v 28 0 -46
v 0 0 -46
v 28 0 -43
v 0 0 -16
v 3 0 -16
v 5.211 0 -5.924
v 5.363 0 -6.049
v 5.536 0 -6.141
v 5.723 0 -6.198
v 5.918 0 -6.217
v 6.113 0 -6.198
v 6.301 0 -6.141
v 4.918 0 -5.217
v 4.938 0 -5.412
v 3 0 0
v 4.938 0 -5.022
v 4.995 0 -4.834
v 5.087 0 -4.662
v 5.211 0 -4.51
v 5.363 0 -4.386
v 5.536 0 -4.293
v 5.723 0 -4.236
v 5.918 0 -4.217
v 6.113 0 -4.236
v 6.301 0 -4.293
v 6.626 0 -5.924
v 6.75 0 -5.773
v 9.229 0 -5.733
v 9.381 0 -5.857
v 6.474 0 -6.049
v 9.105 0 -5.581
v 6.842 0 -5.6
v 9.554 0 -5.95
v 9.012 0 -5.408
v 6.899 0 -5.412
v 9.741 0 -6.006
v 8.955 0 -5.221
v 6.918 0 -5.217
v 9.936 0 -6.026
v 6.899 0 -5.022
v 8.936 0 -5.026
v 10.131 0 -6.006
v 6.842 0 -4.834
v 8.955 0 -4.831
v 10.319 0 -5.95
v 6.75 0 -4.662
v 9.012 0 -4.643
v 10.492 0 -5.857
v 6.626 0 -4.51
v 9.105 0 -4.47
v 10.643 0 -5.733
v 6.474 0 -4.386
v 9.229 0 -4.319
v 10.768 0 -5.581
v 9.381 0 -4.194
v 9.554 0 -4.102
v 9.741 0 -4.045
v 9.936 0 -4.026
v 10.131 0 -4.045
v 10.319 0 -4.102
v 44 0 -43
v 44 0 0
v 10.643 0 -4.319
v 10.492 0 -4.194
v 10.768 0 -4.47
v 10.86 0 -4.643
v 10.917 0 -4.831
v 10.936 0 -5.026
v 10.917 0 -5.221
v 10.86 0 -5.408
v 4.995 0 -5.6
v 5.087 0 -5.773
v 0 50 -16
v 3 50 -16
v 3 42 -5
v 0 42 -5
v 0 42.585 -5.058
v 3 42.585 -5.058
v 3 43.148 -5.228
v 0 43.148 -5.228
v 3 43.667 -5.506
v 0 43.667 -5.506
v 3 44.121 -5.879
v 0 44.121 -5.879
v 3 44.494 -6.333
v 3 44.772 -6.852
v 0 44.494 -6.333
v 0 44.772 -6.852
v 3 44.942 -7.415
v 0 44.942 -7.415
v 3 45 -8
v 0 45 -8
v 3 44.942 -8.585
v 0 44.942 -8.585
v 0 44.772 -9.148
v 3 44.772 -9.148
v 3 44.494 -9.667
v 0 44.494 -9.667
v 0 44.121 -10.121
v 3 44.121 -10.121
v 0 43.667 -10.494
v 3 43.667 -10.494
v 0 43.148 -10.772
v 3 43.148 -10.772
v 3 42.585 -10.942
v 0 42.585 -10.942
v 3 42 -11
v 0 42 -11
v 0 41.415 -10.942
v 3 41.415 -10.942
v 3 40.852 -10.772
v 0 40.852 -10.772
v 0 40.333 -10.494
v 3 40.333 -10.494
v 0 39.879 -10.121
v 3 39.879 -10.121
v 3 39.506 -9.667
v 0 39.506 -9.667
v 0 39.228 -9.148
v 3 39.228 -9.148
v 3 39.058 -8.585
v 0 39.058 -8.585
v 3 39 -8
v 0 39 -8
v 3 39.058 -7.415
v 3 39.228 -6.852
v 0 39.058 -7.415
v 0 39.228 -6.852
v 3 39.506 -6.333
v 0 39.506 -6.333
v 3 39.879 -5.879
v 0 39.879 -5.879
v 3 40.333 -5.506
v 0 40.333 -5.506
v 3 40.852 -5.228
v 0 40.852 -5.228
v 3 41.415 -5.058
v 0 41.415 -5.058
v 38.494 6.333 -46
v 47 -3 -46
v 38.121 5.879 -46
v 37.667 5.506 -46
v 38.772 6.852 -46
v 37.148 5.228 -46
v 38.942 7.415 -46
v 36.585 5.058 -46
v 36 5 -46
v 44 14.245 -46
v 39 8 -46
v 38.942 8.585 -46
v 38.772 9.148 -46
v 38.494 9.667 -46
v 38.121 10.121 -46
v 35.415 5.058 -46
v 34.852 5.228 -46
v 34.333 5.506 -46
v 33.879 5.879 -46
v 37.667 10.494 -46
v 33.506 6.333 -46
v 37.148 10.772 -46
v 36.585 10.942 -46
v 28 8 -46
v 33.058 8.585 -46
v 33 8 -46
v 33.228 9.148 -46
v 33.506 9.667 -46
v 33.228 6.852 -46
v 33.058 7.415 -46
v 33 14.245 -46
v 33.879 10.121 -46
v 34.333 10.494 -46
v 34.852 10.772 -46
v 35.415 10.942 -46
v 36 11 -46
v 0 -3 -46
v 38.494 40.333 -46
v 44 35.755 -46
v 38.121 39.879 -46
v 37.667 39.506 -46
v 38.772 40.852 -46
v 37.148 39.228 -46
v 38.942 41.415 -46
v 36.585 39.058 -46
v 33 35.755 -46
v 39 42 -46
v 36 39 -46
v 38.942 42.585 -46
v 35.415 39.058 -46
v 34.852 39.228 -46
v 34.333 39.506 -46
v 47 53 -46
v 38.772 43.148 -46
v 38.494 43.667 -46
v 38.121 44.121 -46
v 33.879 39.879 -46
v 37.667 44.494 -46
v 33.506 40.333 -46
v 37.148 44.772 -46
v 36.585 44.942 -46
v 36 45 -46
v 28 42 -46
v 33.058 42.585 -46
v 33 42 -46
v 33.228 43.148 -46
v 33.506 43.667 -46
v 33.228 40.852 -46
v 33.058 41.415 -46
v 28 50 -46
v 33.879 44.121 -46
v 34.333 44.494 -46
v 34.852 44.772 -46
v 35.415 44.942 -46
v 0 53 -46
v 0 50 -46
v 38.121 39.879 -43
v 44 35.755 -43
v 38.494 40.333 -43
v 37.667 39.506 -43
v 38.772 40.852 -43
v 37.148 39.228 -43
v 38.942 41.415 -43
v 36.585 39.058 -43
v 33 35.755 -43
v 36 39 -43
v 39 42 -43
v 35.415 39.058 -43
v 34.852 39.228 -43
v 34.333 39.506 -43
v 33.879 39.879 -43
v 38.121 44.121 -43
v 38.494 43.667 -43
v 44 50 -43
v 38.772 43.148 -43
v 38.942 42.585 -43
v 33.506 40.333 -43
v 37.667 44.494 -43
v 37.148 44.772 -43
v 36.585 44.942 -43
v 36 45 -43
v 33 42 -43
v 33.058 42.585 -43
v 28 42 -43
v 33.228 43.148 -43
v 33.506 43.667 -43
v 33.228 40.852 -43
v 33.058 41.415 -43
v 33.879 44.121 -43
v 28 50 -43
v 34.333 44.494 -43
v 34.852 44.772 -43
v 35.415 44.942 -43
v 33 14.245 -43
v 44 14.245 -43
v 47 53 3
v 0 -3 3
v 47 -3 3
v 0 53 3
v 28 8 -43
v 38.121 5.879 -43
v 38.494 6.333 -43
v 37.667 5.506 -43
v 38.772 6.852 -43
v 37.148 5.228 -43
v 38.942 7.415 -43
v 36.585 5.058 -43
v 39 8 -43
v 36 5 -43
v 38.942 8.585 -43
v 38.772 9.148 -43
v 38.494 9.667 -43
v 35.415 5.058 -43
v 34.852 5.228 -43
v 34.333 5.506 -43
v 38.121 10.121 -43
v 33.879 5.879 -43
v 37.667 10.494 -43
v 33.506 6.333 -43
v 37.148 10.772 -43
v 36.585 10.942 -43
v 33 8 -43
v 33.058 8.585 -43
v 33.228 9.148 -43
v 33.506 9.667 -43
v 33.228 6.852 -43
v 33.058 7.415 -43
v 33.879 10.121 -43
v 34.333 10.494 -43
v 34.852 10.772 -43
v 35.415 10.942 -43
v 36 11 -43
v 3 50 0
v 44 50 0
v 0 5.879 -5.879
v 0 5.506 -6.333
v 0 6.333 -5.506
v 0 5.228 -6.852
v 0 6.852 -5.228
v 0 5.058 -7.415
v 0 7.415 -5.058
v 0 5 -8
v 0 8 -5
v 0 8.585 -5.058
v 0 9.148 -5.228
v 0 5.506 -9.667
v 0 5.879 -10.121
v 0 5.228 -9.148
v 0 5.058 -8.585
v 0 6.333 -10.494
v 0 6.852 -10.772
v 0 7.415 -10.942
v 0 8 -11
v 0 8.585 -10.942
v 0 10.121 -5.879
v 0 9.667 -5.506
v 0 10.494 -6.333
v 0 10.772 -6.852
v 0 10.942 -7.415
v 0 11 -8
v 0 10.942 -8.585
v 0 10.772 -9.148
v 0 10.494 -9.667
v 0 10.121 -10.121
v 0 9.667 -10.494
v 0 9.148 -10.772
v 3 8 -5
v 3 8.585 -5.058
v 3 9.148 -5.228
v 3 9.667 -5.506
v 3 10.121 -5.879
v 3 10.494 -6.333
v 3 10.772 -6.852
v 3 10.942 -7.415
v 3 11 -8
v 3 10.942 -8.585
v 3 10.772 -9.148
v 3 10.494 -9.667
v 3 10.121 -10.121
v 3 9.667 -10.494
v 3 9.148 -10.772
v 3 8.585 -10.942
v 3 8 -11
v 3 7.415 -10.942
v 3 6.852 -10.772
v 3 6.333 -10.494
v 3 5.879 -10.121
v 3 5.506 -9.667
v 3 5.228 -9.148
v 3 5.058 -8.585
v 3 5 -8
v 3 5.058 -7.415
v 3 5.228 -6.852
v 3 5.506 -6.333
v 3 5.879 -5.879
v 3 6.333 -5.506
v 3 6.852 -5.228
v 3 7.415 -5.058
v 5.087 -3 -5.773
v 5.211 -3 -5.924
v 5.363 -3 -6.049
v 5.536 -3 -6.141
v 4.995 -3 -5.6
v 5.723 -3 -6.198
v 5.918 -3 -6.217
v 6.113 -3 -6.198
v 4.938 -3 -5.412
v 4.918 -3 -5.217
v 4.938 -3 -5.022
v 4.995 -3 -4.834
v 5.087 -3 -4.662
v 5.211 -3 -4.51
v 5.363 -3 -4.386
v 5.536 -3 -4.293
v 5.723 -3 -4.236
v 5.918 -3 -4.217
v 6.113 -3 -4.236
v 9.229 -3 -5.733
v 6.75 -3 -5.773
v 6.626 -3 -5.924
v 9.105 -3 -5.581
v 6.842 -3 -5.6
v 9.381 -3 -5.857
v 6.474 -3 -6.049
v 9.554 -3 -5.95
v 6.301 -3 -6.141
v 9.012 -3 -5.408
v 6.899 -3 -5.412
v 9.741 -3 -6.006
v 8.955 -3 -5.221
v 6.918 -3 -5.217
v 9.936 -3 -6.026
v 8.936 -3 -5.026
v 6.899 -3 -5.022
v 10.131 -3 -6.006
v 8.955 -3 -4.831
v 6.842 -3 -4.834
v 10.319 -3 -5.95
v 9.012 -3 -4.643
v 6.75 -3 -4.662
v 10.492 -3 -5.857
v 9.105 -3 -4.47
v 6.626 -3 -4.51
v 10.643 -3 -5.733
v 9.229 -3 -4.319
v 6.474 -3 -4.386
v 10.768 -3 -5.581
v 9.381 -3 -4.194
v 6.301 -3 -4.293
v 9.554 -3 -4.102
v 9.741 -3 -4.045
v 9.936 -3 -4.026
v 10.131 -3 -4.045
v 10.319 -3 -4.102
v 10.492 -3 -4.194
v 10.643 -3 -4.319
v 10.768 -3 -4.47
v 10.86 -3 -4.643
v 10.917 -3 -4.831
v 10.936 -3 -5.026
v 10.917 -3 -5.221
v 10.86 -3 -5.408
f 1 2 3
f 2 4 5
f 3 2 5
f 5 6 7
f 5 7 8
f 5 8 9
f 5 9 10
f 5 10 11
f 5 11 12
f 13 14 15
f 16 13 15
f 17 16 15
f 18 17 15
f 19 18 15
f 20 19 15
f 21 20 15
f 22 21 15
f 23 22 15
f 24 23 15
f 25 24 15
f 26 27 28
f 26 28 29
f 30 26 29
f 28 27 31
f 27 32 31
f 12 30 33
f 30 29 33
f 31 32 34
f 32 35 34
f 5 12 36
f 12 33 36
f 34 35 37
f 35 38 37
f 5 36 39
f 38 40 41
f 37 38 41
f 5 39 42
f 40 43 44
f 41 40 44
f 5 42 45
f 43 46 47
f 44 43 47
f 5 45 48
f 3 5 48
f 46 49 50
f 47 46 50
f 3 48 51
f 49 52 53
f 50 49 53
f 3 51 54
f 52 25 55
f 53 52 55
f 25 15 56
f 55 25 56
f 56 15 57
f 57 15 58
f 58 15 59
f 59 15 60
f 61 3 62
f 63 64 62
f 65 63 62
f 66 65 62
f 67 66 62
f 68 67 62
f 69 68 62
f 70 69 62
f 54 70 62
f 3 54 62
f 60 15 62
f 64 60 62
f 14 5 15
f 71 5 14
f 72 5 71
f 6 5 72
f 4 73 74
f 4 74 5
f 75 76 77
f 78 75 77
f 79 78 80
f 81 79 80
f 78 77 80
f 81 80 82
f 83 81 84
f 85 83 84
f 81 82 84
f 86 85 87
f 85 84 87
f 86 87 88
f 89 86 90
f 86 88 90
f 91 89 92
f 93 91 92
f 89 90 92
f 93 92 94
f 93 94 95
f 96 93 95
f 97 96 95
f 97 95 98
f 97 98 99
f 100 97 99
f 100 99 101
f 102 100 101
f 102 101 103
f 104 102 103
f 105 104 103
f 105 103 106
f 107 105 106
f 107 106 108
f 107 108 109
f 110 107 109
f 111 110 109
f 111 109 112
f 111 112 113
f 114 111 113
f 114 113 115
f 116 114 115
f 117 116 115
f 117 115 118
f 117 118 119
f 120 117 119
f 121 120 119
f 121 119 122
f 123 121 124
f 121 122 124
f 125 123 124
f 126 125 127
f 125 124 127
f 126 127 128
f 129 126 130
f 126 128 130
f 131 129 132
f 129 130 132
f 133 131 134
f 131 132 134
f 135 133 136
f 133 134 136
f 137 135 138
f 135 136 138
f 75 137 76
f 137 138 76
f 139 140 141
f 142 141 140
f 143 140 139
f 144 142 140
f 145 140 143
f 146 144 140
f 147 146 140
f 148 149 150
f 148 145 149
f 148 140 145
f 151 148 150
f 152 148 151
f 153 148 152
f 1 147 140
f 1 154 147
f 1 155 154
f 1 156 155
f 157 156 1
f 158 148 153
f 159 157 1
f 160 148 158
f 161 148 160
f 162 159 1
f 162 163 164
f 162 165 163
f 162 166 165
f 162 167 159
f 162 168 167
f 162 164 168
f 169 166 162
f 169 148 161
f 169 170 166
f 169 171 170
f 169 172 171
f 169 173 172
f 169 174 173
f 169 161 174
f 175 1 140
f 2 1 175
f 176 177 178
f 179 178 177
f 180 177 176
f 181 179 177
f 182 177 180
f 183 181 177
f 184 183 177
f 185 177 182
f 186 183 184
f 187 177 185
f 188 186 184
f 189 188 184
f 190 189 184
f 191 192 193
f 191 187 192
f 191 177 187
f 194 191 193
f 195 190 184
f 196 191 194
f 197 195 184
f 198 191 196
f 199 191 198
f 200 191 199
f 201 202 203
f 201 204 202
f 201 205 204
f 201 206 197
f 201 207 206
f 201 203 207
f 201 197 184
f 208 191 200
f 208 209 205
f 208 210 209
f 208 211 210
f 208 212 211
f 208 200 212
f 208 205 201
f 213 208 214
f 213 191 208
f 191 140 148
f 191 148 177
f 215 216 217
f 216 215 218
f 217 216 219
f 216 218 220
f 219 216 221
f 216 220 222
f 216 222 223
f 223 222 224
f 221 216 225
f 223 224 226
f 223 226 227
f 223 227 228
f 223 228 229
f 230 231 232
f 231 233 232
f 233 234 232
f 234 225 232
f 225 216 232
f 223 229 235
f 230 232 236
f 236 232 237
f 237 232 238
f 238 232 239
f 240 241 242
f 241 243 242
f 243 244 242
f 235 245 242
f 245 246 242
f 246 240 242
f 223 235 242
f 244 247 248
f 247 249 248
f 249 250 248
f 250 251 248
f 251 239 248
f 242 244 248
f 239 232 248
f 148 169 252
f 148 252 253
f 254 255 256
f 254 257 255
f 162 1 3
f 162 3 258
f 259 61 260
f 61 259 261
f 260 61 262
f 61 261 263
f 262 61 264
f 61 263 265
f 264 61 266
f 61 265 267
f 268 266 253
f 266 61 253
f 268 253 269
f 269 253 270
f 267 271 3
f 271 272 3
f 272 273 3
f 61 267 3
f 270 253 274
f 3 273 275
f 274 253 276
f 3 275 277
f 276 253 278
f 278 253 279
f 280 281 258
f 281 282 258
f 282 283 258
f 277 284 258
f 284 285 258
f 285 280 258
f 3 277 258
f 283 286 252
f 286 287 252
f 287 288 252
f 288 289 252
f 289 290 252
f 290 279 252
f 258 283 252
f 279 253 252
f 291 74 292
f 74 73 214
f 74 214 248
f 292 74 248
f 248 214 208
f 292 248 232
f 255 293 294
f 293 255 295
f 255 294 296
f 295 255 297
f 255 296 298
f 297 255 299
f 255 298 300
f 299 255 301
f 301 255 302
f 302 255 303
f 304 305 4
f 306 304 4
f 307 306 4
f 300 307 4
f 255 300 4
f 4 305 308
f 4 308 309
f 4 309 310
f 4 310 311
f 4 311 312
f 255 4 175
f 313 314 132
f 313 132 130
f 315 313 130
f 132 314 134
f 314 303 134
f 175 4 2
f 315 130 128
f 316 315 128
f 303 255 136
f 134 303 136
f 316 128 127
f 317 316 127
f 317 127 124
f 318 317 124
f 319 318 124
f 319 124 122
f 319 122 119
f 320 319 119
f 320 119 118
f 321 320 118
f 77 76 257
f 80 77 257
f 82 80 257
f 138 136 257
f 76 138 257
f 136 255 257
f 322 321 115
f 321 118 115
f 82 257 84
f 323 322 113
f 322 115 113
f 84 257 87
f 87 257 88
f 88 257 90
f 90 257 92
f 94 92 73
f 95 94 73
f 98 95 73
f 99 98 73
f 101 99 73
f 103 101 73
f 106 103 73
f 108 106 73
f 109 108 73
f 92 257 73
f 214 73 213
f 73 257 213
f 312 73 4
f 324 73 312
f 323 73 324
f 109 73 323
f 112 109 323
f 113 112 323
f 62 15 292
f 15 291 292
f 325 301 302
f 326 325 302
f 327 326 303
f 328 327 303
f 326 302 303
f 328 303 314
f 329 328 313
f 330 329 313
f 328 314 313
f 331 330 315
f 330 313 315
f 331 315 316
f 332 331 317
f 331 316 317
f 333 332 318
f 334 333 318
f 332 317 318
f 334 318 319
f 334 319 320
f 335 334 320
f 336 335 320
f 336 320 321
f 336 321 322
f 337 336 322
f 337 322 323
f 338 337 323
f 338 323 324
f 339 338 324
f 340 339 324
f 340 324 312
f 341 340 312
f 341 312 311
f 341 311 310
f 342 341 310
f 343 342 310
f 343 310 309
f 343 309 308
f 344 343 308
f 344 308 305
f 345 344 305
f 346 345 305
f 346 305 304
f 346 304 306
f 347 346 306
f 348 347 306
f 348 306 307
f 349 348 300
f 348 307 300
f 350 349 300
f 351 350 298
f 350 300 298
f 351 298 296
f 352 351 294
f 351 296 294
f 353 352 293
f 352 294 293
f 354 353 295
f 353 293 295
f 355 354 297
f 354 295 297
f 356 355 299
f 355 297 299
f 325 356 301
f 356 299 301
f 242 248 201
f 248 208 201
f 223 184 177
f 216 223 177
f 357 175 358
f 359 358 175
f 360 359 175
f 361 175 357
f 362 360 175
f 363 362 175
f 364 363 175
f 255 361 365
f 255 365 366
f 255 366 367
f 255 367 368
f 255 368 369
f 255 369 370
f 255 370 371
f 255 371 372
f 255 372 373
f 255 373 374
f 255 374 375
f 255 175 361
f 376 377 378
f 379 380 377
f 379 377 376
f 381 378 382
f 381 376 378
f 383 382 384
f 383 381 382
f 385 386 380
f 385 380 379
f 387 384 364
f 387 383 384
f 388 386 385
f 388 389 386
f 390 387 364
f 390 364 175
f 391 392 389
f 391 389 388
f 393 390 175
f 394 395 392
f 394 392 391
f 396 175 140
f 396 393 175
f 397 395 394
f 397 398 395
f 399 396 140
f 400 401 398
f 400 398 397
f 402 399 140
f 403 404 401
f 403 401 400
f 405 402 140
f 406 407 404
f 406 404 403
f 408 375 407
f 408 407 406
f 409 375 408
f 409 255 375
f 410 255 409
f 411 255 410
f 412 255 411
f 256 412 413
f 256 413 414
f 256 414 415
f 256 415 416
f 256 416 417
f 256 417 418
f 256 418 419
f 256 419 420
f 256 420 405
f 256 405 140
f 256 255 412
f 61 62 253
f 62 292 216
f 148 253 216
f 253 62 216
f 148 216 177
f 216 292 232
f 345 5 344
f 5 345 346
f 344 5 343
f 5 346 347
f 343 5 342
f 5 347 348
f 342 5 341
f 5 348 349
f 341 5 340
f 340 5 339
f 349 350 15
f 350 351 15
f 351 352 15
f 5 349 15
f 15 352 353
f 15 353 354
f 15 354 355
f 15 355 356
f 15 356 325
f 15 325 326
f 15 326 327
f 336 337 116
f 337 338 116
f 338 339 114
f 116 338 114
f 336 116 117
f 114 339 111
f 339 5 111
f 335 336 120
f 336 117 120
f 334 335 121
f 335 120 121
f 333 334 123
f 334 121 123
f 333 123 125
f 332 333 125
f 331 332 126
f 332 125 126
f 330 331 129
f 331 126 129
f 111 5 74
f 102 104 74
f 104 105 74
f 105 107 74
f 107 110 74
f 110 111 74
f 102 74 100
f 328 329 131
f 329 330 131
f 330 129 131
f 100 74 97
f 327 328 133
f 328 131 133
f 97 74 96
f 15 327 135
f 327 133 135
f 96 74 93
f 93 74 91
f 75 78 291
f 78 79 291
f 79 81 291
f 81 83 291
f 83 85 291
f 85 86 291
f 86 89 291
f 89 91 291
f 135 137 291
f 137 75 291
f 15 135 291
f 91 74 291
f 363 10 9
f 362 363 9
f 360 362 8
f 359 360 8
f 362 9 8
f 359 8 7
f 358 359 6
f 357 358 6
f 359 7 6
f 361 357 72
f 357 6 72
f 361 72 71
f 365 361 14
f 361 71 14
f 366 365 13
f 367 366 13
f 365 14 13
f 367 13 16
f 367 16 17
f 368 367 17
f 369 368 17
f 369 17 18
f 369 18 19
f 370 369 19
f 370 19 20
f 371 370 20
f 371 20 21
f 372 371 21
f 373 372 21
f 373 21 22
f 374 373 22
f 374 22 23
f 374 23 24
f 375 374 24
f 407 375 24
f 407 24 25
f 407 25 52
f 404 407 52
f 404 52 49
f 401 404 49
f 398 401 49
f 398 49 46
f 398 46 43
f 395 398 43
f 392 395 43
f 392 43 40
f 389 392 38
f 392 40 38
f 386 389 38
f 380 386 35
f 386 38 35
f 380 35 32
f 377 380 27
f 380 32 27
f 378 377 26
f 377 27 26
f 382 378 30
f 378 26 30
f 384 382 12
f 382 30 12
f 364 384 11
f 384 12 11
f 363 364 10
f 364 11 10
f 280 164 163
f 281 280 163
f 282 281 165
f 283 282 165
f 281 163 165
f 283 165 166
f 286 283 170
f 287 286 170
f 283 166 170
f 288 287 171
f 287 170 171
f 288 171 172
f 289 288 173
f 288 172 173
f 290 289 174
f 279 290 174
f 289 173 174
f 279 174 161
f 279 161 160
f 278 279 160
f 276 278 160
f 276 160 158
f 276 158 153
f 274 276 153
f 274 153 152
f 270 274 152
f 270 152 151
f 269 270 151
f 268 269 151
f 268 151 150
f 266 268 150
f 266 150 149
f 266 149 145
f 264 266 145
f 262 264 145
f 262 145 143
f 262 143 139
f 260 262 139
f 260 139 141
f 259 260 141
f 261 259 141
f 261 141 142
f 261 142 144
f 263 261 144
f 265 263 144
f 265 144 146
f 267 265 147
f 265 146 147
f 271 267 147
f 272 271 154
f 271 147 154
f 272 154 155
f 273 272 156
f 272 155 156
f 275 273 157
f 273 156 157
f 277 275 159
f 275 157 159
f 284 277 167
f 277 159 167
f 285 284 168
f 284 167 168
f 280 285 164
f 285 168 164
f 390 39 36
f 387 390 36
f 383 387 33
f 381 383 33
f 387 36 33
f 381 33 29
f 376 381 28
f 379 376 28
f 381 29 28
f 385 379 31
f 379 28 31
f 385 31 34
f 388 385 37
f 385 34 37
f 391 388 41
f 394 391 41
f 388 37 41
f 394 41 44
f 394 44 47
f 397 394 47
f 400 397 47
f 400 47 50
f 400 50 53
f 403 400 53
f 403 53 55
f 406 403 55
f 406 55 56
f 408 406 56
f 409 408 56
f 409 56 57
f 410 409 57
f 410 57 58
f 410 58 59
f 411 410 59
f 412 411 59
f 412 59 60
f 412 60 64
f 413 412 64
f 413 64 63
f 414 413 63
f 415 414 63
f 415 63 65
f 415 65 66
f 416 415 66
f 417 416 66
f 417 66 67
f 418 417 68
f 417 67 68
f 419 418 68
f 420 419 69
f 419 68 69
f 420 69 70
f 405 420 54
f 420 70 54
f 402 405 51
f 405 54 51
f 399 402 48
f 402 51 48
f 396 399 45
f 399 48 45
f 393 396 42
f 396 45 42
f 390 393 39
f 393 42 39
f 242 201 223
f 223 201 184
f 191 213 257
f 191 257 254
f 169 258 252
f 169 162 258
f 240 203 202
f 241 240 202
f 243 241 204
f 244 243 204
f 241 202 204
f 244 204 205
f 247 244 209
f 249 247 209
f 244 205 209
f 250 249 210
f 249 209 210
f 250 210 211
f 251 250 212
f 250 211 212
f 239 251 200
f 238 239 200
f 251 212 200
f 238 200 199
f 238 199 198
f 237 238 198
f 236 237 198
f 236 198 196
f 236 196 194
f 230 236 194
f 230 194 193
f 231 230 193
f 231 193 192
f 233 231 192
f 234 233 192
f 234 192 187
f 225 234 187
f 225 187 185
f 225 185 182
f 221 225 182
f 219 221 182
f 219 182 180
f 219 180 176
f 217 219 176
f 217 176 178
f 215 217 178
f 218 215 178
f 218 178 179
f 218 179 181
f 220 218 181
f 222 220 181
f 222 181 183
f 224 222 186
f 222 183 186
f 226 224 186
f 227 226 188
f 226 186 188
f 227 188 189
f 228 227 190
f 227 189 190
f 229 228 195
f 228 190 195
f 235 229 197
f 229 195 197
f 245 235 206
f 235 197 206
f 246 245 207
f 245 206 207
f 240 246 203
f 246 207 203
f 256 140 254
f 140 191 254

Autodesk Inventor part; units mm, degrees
ref_plane "YZ Plane" through (0, 0, 0) normal (1, 0, 0) x (0, 1, 0)
ref_plane "XZ Plane" through (0, 0, 0) normal (0, 1, 0) x (-1, 0, 0)
ref_plane "XY Plane" through (0, 0, 0) normal (0, 0, 1) x (1, 0, 0)
sketch "Esboço1" plane through (0, 0, 0) normal (0, 0, 1) x (1, 0, 0)
  line L0 (0, 0) -> (44, 0)
  line L1 (44, 0) -> (44, 50)
  line L2 (44, 50) -> (0, 50)
  line L3 (0, 50) -> (0, 0)
  dimension "d0" = 44
  dimension "d1" = 50
extrude "Extrusão1" add sketch "Esboço1" along normal blind 3
sketch "Esboço2" plane through (0, 0, 0) normal (-1, 0, 0) x (0, 0, 1)
  line L0 (0, 0) -> (0, 50) projected
  line L1 (0, 50) -> (-16, 50)
  line L2 (-16, 50) -> (-16, 0)
  line L3 (-16, 0) -> (0, 0)
  line L4 (0, 0) -> (0, 50)
  line L5 (0, 50) -> (-8, 50) construction
  line L6 (-8, 50) -> (-8, 42) construction
  line L7 (0, 0) -> (-8, 0) construction
  line L8 (-8, 0) -> (-8, 8) construction
  circle A0 centre (-8, 42) radius 3
  circle A1 centre (-8, 8) radius 3
  dimension "d4" = 16
  dimension "d5" = 50
  dimension "d6" = 8
  dimension "d7" = 8
  dimension "d8" = 8
  dimension "d9" = 8
  dimension "d10" = 6
  dimension "d11" = 6
extrude "Extrusão2" add sketch "Esboço2" against normal blind 3
sketch "Esboço3" plane through (44, 0, 0) normal (1, 0, 0) x (0, 0, -1)
  line L0 (0, 50) -> (-3, 50) projected
  line L1 (-3, 50) -> (46, 50)
  line L2 (46, 50) -> (46, 0)
  line L3 (46, 0) -> (-3, 0)
  line L4 (-3, 0) -> (-3, 50)
  point P0 (0, 0)
  dimension "d14" = 49
extrude "Extrusão3" add sketch "Esboço3" along normal blind 3
sketch "Esboço4" plane through (44, 0, -46) normal (0, 0, -1) x (-1, 0, 0)
  line L0 (0, 50) -> (41, 50) construction
  line L1 (0, 50) -> (8, 50) construction
  line L2 (8, 50) -> (8, 42) construction
  line L3 (0, 50) -> (0, 0) construction
  line L4 (0, 0) -> (8, 0) construction
  line L5 (41, 0) -> (0, 0) construction
  line L6 (8, 0) -> (8, 8) construction
  circle A0 centre (8, 42) radius 3
  circle A1 centre (8, 8) radius 3
  line L7 (0, 50) -> (16, 50)
  line L8 (16, 50) -> (16, 42)
  line L9 (16, 42) -> (11, 35.755)
  line L10 (11, 35.755) -> (0, 35.755)
  line L11 (0, 50) -> (0, 35.755)
  line L12 (0, 0) -> (16, 0)
  line L13 (16, 0) -> (16, 8)
  line L14 (16, 8) -> (11, 14.245)
  line L15 (11, 14.245) -> (0, 14.245)
  line L16 (0, 0) -> (0, 14.245)
  point P0 (44, 0)
  dimension "d17" = 8
  dimension "d18" = 8
  dimension "d19" = 8
  dimension "d20" = 8
  dimension "d21" = 6
  dimension "d22" = 6
  dimension "d23" = 16
  dimension "d24" = 8
  dimension "d25" = 8
  dimension "d26" = 8
extrude "Extrusão4" add sketch "Esboço4" against normal blind 3
sketch "Esboço5" plane through (0, 50, -16) normal (0, 1, 0) x (1, 0, 0)
  line L0 (0, 0) -> (0, -19) projected
  line L1 (47, 30) -> (47, -19) projected
  line L2 (0, -19) -> (47, -19)
  line L3 (47, -19) -> (47, 30)
  line L4 (47, 30) -> (0, 30)
  line L5 (0, 30) -> (0, -19)
  point P0 (0, -16)
extrude "Extrusão5" add sketch "Esboço5" along normal blind 3
sketch "Esboço6" plane through (0, 0, -16) normal (0, -1, 0) x (1, 0, 0)
  line L0 (47, -30) -> (0, -30) projected
  line L1 (0, 19) -> (47, 19) projected
  line L2 (0, -30) -> (47, -30)
  line L3 (47, -30) -> (47, 19)
  line L4 (47, 19) -> (0, 19)
  line L5 (0, 19) -> (0, -30)
  point P0 (0, 16)
extrude "Extrusão6" add sketch "Esboço6" along normal blind 3
sketch "Esboço7" plane through (0, -3, -16) normal (0, -1, 0) x (1, 0, 0)
  point P0 (0, 16)
  point P1 (5.9184, 10.7829)
  point P2 (9.9362, 10.9743)
hole "Furo1" at (5.9184, -3, -5.2171) at (9.9362, -3, -5.0257) direction (0, 1, 0) diameter 2 depth 3 tip angle 118
sketch "Esboço8" plane through (0, -3, -16) normal (0, -1, 0) x (1, 0, 0)
  circle A0 centre (5.9184, 10.7829) radius 1 projected
sketch "Esboço9" plane through (0, -3, -16) normal (0, -1, 0) x (1, 0, 0)
  circle A0 centre (9.9362, 10.9743) radius 1 projected
properties part number "KS diant C" material "Plástico, preto opaco"
